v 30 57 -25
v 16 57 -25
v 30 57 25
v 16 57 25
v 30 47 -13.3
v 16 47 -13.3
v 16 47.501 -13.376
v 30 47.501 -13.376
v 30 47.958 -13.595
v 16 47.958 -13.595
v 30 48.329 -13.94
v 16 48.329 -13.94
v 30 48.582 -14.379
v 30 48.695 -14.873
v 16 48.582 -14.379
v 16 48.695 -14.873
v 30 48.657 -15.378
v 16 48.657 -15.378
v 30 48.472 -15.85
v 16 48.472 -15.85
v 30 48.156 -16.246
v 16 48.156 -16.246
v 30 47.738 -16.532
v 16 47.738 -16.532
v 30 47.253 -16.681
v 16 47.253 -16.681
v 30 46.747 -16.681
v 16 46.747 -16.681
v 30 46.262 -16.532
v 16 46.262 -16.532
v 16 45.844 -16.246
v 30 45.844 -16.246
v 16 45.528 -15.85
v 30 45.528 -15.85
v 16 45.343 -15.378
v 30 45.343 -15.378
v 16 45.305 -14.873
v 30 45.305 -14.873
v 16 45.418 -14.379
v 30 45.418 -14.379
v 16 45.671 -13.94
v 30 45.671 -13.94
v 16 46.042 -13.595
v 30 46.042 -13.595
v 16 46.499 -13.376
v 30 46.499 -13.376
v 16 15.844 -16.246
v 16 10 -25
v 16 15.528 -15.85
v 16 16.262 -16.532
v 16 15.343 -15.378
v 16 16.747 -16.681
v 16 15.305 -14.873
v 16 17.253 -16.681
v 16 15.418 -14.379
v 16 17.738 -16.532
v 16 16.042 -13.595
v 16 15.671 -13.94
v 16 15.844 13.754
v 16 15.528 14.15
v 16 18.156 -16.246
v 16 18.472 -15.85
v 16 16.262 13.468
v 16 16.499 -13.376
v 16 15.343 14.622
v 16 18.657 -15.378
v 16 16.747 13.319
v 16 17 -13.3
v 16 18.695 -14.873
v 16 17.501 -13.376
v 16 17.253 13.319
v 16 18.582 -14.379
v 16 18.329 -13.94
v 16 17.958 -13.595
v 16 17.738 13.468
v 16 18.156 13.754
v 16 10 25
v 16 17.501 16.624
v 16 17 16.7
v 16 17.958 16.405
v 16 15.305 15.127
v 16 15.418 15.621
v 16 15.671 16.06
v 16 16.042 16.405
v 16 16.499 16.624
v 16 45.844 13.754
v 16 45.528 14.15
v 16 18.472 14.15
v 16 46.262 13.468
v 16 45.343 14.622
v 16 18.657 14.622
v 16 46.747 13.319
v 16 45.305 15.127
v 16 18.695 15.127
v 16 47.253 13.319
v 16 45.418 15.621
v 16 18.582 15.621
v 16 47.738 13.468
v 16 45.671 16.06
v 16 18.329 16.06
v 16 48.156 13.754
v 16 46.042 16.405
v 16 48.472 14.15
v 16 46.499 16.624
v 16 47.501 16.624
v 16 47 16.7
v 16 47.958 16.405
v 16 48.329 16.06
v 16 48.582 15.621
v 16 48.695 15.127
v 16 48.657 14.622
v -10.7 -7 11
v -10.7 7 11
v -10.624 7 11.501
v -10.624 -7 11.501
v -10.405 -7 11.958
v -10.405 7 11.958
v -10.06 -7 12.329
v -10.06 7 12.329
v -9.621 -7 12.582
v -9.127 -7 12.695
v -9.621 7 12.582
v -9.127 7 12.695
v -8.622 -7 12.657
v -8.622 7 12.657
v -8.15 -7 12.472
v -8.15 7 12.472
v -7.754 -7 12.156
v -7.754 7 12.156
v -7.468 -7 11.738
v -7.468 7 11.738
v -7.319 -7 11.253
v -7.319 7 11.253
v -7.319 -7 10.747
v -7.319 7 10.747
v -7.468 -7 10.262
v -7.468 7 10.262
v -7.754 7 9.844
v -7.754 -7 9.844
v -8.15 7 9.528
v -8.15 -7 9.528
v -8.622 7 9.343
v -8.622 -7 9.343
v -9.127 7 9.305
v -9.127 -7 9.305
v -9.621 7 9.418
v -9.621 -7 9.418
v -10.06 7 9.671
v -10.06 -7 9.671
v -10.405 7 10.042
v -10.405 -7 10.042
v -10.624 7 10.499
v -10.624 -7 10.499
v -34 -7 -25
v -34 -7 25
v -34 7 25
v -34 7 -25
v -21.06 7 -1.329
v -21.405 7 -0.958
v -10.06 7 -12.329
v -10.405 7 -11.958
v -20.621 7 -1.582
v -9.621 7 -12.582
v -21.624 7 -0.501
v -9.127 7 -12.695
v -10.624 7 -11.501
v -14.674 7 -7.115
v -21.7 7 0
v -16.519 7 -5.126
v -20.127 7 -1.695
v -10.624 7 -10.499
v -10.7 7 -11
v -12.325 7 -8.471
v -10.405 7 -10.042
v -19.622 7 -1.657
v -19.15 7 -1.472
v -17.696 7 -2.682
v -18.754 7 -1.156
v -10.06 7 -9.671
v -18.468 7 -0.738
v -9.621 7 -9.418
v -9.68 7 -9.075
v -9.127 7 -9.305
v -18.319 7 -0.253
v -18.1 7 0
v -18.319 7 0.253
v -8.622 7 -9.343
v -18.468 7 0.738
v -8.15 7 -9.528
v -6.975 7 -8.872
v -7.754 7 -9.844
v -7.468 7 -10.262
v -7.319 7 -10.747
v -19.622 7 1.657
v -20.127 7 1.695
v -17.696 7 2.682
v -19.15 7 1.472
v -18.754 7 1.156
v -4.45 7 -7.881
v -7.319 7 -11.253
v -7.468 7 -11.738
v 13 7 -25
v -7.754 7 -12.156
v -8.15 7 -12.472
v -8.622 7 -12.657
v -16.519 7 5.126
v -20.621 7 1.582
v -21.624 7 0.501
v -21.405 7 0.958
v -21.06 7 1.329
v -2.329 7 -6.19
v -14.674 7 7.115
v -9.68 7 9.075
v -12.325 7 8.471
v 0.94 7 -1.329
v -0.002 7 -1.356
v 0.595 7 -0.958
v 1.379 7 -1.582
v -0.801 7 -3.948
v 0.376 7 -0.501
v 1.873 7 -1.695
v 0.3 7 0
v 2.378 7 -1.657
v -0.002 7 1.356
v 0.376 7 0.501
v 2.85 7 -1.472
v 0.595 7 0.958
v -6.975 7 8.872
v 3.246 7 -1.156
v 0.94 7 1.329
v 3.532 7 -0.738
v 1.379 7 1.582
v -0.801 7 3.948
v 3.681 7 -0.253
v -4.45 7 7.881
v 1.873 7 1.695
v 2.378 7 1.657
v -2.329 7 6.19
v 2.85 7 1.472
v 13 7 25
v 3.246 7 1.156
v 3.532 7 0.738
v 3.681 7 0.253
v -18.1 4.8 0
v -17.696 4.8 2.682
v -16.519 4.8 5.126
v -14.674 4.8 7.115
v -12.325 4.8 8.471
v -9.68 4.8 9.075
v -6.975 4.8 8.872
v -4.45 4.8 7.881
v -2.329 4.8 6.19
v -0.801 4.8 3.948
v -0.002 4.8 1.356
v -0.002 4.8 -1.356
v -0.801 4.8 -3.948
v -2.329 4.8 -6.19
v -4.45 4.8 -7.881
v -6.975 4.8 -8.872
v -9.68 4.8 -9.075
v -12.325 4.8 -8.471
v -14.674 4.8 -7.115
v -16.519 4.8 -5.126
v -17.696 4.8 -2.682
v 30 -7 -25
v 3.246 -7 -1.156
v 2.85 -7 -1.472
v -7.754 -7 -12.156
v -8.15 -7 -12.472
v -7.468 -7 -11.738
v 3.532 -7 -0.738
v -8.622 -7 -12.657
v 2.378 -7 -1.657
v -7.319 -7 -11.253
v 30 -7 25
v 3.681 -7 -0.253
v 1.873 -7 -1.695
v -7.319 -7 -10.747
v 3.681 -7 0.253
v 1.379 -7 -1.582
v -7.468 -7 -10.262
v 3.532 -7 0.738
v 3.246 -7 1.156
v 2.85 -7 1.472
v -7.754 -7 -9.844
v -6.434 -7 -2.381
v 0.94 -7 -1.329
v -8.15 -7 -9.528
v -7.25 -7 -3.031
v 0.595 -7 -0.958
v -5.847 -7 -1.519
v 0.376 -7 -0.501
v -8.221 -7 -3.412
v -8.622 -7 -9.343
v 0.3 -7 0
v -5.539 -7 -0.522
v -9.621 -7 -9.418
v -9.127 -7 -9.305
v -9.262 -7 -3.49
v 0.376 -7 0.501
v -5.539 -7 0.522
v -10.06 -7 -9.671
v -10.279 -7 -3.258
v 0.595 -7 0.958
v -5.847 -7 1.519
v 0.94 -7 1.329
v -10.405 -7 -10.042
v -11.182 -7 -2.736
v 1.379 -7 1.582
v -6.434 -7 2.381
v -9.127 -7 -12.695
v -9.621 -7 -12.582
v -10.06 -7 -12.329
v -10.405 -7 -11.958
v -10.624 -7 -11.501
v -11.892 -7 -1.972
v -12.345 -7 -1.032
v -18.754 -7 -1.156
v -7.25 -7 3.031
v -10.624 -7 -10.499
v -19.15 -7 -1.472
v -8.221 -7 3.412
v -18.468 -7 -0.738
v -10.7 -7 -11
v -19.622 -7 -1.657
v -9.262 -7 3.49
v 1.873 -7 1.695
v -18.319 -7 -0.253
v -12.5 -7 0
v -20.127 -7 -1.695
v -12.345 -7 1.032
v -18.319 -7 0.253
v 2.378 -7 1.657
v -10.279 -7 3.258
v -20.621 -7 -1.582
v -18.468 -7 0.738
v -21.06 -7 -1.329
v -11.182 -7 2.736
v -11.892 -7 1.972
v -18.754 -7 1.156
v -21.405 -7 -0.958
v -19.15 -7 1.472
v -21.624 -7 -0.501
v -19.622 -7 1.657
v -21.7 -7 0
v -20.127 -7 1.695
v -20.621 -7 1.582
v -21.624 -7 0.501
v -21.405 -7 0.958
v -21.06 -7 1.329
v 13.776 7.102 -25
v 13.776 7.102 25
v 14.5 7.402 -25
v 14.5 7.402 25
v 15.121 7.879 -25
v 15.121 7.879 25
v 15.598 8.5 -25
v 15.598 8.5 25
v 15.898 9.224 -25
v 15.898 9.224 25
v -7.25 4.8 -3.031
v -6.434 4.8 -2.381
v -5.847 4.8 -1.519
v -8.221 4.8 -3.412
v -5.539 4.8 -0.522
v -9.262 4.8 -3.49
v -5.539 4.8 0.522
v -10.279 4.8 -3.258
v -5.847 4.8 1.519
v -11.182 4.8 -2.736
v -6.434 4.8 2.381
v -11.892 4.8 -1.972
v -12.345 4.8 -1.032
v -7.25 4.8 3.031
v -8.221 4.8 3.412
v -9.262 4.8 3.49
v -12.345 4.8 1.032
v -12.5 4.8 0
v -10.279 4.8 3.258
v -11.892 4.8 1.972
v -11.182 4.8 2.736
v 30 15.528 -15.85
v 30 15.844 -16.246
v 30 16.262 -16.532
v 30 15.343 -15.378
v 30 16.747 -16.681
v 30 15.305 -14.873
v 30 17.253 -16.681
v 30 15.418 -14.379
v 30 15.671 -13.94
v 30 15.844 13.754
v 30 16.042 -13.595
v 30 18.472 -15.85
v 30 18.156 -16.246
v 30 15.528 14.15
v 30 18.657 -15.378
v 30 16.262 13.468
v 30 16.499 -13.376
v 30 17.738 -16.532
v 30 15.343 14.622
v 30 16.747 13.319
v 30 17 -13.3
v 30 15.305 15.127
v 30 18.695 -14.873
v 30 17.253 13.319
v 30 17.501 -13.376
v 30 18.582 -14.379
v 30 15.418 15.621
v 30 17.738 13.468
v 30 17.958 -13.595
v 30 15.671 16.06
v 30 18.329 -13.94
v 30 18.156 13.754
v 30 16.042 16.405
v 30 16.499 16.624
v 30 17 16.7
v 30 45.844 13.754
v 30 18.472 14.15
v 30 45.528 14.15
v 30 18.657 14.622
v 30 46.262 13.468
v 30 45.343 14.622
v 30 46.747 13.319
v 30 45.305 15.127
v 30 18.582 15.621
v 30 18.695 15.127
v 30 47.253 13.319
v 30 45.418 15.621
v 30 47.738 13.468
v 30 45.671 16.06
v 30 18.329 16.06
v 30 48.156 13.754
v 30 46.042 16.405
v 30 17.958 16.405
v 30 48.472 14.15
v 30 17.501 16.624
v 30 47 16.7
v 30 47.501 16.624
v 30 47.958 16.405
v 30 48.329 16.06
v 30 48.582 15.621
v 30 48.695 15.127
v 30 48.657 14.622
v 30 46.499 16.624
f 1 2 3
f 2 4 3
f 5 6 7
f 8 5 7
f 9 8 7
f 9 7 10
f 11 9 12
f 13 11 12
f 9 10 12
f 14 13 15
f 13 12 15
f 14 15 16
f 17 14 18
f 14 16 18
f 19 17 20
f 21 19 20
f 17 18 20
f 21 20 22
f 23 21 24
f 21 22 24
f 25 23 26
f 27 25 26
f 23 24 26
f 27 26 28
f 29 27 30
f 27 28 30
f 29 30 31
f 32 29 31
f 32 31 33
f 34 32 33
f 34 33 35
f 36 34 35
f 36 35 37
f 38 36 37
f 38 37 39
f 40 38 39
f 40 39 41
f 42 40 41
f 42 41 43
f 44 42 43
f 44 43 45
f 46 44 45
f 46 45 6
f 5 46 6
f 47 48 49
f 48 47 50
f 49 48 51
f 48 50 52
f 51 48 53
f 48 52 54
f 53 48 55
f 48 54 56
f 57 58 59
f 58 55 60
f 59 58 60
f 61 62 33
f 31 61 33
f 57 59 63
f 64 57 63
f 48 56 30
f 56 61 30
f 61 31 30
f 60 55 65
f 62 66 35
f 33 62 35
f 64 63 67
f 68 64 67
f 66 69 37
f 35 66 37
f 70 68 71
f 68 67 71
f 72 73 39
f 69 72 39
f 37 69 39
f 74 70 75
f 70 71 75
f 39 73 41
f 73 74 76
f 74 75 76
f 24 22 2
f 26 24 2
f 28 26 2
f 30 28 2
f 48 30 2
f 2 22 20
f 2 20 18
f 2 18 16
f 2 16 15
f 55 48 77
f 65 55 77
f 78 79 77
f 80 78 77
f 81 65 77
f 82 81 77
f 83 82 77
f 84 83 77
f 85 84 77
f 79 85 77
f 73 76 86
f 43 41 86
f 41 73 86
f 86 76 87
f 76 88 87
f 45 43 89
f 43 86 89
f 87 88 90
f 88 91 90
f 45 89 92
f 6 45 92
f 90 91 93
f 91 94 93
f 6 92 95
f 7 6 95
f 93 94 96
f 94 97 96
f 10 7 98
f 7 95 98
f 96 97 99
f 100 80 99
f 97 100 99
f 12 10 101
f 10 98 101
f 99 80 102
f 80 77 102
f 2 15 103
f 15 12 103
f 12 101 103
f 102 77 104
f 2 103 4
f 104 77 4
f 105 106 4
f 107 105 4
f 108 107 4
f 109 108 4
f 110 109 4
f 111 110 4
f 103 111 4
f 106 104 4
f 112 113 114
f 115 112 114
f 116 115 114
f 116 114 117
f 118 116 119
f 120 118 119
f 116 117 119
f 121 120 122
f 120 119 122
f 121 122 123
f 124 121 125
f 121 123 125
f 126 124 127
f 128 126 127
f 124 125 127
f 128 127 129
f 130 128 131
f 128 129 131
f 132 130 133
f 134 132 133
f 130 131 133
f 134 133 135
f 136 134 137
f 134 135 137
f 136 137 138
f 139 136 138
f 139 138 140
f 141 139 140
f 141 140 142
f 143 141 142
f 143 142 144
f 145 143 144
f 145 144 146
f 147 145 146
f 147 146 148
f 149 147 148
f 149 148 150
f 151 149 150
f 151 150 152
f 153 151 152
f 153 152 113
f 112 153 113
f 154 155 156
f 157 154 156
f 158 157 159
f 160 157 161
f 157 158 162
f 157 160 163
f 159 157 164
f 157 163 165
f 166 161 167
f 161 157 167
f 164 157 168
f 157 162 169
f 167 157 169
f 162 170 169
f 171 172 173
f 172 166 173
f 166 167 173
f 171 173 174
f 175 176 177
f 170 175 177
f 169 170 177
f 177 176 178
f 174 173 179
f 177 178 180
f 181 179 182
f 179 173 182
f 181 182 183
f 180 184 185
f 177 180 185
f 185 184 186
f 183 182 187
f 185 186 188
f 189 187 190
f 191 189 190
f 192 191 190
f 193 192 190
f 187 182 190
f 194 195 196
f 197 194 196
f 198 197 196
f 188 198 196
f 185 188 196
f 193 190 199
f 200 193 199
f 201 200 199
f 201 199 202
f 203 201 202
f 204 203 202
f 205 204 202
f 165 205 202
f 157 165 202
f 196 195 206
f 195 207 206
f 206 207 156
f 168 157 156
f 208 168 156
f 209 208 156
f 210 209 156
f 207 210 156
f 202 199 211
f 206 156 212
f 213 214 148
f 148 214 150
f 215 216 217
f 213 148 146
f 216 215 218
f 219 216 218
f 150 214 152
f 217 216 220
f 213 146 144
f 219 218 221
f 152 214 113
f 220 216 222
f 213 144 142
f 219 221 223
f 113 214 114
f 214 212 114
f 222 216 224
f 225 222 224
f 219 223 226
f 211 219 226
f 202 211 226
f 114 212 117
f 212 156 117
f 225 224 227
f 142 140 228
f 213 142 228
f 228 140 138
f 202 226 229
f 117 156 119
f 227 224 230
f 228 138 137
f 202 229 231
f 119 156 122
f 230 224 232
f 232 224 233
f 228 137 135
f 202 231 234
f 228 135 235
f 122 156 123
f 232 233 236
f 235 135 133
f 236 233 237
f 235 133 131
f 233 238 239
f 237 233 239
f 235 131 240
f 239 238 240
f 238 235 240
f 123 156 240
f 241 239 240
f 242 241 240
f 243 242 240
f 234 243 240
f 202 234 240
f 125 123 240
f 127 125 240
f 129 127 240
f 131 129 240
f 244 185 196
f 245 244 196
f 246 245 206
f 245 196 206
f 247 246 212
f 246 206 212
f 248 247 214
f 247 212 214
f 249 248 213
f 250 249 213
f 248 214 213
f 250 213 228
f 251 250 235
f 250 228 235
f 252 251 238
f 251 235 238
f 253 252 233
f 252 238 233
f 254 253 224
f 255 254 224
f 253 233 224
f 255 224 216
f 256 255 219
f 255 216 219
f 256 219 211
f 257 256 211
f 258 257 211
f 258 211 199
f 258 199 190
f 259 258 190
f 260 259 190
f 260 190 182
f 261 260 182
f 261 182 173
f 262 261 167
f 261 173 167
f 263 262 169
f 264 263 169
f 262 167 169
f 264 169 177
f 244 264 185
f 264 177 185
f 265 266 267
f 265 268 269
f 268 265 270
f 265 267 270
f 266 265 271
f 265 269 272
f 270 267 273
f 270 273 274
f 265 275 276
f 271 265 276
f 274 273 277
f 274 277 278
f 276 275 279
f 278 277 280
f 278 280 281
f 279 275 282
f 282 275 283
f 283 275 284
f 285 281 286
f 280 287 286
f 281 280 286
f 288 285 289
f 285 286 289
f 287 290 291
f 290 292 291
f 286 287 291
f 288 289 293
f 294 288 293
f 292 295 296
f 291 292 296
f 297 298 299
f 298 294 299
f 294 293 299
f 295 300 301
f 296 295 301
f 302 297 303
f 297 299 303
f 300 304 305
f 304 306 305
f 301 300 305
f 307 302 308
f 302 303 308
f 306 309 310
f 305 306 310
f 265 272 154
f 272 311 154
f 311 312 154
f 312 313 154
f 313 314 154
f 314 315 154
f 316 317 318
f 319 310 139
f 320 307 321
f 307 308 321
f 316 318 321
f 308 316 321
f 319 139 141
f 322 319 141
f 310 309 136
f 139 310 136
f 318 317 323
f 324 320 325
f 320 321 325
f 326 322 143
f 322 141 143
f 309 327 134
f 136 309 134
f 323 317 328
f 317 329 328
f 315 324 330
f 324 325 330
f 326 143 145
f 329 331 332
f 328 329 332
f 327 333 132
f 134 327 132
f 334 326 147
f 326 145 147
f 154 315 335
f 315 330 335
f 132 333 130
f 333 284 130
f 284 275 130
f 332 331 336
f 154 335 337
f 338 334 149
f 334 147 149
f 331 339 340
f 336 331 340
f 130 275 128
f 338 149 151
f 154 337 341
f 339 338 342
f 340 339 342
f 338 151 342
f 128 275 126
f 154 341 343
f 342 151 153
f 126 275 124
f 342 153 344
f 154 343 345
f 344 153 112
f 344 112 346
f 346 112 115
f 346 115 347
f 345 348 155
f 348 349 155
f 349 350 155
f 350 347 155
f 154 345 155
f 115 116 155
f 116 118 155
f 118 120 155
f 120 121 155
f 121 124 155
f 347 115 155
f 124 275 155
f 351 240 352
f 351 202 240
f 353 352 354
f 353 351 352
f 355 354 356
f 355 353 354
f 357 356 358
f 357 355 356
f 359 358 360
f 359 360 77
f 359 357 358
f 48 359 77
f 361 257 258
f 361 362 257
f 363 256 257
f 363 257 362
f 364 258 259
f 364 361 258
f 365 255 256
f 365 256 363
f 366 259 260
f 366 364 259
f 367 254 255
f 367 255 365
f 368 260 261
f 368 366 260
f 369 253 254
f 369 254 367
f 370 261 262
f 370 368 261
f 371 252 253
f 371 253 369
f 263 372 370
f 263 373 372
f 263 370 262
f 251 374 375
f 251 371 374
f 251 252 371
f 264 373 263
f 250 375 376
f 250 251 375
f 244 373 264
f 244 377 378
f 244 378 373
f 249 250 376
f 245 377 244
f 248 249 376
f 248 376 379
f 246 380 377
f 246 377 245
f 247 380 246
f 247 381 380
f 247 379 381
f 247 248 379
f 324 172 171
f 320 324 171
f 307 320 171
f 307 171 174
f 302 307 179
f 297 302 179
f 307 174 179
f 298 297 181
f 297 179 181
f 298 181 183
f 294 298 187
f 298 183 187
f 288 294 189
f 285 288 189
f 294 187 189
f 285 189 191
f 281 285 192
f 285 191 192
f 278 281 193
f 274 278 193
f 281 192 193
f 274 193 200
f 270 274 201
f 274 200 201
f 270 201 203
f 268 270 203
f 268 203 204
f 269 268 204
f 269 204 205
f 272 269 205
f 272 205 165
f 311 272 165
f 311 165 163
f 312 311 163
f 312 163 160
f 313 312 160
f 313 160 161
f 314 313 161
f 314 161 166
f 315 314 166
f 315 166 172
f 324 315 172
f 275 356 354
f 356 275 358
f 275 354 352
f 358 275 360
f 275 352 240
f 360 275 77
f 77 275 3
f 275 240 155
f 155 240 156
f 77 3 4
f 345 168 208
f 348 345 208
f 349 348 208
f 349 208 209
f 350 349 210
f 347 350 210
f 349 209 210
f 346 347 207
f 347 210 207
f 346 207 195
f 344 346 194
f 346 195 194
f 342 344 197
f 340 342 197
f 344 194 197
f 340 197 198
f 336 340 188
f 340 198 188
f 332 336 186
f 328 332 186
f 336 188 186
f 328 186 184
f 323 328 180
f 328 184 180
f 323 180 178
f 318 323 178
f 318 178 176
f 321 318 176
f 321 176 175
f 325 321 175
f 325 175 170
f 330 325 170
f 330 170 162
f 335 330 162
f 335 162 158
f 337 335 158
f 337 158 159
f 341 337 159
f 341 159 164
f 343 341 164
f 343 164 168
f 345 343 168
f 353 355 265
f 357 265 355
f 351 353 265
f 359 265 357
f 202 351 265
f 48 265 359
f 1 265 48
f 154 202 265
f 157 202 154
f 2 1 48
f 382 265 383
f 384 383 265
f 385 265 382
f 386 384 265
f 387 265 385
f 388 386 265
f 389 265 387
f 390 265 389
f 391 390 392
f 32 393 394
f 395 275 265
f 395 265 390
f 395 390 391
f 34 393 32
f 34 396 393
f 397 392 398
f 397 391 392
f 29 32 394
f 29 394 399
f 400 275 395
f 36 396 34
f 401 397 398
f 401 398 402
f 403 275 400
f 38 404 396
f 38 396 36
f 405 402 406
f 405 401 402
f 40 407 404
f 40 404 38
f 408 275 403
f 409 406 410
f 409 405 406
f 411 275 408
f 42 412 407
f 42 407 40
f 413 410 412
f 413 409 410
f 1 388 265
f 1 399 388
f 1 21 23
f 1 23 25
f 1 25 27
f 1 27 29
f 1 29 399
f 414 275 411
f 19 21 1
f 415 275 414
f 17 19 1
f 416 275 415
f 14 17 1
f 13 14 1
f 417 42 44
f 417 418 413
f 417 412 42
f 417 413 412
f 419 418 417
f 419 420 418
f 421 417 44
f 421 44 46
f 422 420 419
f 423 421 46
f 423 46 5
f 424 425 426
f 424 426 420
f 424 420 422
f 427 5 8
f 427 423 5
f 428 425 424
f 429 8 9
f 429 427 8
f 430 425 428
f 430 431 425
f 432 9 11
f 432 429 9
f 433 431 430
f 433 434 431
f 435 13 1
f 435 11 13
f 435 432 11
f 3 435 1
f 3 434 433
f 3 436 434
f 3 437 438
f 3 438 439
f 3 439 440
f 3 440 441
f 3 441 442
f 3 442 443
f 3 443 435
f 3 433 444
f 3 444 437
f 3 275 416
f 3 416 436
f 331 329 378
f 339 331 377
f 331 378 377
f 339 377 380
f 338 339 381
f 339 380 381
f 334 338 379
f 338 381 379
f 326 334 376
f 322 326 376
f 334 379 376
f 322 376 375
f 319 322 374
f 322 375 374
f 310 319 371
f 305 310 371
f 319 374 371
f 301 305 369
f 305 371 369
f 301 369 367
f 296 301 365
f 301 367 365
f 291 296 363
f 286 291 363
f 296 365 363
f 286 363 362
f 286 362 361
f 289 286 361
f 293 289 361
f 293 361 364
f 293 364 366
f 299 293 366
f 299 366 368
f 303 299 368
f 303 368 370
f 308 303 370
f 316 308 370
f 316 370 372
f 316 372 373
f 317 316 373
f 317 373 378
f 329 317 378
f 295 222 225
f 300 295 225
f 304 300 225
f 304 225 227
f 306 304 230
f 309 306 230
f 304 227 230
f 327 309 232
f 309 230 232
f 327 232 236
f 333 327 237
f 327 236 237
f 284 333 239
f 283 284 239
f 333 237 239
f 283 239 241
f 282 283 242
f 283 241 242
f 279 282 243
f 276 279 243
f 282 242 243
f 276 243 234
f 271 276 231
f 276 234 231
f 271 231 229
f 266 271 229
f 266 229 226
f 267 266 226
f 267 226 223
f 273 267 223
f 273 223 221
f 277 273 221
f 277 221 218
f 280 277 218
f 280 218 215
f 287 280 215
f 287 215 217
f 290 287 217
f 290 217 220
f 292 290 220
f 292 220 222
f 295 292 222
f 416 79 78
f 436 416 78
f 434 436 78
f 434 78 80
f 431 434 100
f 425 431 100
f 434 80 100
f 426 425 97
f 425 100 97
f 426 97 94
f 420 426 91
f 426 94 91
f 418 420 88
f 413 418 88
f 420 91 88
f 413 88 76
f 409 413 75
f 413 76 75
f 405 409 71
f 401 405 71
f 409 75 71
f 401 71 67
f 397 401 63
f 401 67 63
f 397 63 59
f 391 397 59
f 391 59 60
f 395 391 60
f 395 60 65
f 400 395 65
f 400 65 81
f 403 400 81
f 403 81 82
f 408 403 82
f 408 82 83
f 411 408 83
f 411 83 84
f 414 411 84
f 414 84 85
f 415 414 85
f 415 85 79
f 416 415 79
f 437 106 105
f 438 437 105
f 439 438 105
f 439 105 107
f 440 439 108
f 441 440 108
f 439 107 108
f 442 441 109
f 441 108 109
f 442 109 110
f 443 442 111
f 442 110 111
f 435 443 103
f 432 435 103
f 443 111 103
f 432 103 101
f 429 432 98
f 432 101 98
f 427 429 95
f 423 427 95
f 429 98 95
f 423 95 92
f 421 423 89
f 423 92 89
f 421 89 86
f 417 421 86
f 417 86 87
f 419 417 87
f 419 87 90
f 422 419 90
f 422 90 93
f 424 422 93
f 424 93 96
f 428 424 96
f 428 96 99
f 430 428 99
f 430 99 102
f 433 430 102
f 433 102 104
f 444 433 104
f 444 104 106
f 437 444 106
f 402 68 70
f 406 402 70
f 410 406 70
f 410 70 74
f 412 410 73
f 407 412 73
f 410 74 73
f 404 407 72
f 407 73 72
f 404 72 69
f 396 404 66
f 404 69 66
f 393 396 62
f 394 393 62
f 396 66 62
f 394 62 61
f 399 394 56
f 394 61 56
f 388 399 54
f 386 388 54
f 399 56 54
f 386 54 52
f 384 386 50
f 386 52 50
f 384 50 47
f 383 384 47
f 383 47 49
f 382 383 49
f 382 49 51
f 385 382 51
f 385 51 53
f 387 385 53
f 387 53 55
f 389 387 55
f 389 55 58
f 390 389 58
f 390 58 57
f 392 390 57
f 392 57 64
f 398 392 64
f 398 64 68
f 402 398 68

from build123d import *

# Parameters (mm, degrees)
BOSS_EXTRUDE1_DEPTH = 25
SKETCH3_R           = 3.5
CUT_EXTRUDE1_DEPTH  = 66.429351212
SKETCH4_R           = 1.7
CUT_EXTRUDE2_DEPTH  = 66.429351212
SKETCH5_R           = 1.7
CUT_EXTRUDE3_DEPTH  = 80.837334625
SKETCH6_R           = 9.1
CUT_EXTRUDE4_DEPTH  = 2.2
FILLET1_R           = 3


with BuildPart() as part:
    # Sketch2 → Boss-Extrude1 (new, symmetric)
    with BuildSketch(Plane.XY):
        Polygon((-34, 7), (16, 7), (16, 57), (30, 57), (30, 7), (30, -7), (-34, -7), align=None)
    extrude(amount=BOSS_EXTRUDE1_DEPTH, both=True)

    # Sketch3 → Cut-Extrude1 (cut, through all)
    with BuildSketch(Plane(origin=(0, 7, 0), x_dir=(1, 0, 0), z_dir=(0, 1, 0))):
        with Locations(Location((-9, 0, 0), (0, 0, 180))):
            Circle(SKETCH3_R)
    extrude(amount=-CUT_EXTRUDE1_DEPTH, mode=Mode.SUBTRACT)

    # Sketch4 → Cut-Extrude2 (cut, through all)
    with BuildSketch(Plane(origin=(0, 7, 0), x_dir=(1, 0, 0), z_dir=(0, 1, 0))):
        with Locations(Location((-9, 11, 0), (0, 0, 180))):
            Circle(SKETCH4_R)
        with Locations(Location((-20, 0, 0), (0, 0, 180))):
            Circle(SKETCH4_R)
        with Locations(Location((-9, -11, 0), (0, 0, 180))):
            Circle(SKETCH4_R)
        with Locations(Location((2, 0, 0), (0, 0, 180))):
            Circle(SKETCH4_R)
    extrude(amount=-CUT_EXTRUDE2_DEPTH, mode=Mode.SUBTRACT)

    # Sketch5 → Cut-Extrude3 (cut, through all)
    with BuildSketch(Plane.ZY.offset(-16)):
        with Locations((-15, 47)):
            Circle(SKETCH5_R)
        with Locations((-15, 17)):
            Circle(SKETCH5_R)
        with Locations((15, 17)):
            Circle(SKETCH5_R)
        with Locations((15, 47)):
            Circle(SKETCH5_R)
    extrude(amount=-CUT_EXTRUDE3_DEPTH, mode=Mode.SUBTRACT)

    # Sketch6 → Cut-Extrude4 (cut)
    with BuildSketch(Plane(origin=(0, 7, 0), x_dir=(1, 0, 0), z_dir=(0, 1, 0))):
        with Locations(Location((-9, 0, 0), (0, 0, 180))):
            Circle(SKETCH6_R)
    extrude(amount=-CUT_EXTRUDE4_DEPTH, mode=Mode.SUBTRACT)

    # Fillet1
    fillet1_edges = [part.edges().sort_by_distance(p)[0] for p in [
        (16, 7, 0),
    ]]
    fillet(fillet1_edges, radius=FILLET1_R)


solid = part.part
